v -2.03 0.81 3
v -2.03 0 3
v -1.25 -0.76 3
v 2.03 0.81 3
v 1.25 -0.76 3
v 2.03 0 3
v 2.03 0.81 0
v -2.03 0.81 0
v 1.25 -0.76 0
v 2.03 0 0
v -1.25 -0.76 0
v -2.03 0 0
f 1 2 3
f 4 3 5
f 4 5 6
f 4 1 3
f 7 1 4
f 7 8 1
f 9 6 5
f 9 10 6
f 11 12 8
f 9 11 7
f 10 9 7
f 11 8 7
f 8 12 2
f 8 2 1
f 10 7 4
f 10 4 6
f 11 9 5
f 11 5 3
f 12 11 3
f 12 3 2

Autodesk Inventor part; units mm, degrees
ref_plane "YZ Plane" through (0, 0, 0) normal (1, 0, 0) x (0, 1, 0)
ref_plane "XZ Plane" through (0, 0, 0) normal (0, 1, 0) x (-1, 0, 0)
ref_plane "XY Plane" through (0, 0, 0) normal (0, 0, 1) x (1, 0, 0)
sketch "Sketch1" plane through (0, 0, 0) normal (0, 0, 1) x (1, 0, 0)
  line L0 (-2.03, 0.81) -> (2.03, 0.81)
  line L1 (2.03, 0.81) -> (2.03, 0)
  line L2 (2.03, 0) -> (1.25, -0.76)
  line L3 (1.25, -0.76) -> (-1.25, -0.76)
  line L4 (-1.25, -0.76) -> (-2.03, 0)
  line L5 (-2.03, 0) -> (-2.03, 0.81)
  line L6 (-2.03, 0) -> (2.03, 0) construction
  line L7 (0, 0.81) -> (0, -0.76) construction
  point P0 (0, 0)
  point P1 (0, 0)
  dimension "d0" = 4.06
  dimension "d1" = 2.5
  dimension "d2" = 1.57
  dimension "d3" = 0.76
extrude "Extrusion1" add sketch "Sketch1" along normal blind 3
sketch3d "3D Sketch1"
properties part number "HallEffectSensor"
